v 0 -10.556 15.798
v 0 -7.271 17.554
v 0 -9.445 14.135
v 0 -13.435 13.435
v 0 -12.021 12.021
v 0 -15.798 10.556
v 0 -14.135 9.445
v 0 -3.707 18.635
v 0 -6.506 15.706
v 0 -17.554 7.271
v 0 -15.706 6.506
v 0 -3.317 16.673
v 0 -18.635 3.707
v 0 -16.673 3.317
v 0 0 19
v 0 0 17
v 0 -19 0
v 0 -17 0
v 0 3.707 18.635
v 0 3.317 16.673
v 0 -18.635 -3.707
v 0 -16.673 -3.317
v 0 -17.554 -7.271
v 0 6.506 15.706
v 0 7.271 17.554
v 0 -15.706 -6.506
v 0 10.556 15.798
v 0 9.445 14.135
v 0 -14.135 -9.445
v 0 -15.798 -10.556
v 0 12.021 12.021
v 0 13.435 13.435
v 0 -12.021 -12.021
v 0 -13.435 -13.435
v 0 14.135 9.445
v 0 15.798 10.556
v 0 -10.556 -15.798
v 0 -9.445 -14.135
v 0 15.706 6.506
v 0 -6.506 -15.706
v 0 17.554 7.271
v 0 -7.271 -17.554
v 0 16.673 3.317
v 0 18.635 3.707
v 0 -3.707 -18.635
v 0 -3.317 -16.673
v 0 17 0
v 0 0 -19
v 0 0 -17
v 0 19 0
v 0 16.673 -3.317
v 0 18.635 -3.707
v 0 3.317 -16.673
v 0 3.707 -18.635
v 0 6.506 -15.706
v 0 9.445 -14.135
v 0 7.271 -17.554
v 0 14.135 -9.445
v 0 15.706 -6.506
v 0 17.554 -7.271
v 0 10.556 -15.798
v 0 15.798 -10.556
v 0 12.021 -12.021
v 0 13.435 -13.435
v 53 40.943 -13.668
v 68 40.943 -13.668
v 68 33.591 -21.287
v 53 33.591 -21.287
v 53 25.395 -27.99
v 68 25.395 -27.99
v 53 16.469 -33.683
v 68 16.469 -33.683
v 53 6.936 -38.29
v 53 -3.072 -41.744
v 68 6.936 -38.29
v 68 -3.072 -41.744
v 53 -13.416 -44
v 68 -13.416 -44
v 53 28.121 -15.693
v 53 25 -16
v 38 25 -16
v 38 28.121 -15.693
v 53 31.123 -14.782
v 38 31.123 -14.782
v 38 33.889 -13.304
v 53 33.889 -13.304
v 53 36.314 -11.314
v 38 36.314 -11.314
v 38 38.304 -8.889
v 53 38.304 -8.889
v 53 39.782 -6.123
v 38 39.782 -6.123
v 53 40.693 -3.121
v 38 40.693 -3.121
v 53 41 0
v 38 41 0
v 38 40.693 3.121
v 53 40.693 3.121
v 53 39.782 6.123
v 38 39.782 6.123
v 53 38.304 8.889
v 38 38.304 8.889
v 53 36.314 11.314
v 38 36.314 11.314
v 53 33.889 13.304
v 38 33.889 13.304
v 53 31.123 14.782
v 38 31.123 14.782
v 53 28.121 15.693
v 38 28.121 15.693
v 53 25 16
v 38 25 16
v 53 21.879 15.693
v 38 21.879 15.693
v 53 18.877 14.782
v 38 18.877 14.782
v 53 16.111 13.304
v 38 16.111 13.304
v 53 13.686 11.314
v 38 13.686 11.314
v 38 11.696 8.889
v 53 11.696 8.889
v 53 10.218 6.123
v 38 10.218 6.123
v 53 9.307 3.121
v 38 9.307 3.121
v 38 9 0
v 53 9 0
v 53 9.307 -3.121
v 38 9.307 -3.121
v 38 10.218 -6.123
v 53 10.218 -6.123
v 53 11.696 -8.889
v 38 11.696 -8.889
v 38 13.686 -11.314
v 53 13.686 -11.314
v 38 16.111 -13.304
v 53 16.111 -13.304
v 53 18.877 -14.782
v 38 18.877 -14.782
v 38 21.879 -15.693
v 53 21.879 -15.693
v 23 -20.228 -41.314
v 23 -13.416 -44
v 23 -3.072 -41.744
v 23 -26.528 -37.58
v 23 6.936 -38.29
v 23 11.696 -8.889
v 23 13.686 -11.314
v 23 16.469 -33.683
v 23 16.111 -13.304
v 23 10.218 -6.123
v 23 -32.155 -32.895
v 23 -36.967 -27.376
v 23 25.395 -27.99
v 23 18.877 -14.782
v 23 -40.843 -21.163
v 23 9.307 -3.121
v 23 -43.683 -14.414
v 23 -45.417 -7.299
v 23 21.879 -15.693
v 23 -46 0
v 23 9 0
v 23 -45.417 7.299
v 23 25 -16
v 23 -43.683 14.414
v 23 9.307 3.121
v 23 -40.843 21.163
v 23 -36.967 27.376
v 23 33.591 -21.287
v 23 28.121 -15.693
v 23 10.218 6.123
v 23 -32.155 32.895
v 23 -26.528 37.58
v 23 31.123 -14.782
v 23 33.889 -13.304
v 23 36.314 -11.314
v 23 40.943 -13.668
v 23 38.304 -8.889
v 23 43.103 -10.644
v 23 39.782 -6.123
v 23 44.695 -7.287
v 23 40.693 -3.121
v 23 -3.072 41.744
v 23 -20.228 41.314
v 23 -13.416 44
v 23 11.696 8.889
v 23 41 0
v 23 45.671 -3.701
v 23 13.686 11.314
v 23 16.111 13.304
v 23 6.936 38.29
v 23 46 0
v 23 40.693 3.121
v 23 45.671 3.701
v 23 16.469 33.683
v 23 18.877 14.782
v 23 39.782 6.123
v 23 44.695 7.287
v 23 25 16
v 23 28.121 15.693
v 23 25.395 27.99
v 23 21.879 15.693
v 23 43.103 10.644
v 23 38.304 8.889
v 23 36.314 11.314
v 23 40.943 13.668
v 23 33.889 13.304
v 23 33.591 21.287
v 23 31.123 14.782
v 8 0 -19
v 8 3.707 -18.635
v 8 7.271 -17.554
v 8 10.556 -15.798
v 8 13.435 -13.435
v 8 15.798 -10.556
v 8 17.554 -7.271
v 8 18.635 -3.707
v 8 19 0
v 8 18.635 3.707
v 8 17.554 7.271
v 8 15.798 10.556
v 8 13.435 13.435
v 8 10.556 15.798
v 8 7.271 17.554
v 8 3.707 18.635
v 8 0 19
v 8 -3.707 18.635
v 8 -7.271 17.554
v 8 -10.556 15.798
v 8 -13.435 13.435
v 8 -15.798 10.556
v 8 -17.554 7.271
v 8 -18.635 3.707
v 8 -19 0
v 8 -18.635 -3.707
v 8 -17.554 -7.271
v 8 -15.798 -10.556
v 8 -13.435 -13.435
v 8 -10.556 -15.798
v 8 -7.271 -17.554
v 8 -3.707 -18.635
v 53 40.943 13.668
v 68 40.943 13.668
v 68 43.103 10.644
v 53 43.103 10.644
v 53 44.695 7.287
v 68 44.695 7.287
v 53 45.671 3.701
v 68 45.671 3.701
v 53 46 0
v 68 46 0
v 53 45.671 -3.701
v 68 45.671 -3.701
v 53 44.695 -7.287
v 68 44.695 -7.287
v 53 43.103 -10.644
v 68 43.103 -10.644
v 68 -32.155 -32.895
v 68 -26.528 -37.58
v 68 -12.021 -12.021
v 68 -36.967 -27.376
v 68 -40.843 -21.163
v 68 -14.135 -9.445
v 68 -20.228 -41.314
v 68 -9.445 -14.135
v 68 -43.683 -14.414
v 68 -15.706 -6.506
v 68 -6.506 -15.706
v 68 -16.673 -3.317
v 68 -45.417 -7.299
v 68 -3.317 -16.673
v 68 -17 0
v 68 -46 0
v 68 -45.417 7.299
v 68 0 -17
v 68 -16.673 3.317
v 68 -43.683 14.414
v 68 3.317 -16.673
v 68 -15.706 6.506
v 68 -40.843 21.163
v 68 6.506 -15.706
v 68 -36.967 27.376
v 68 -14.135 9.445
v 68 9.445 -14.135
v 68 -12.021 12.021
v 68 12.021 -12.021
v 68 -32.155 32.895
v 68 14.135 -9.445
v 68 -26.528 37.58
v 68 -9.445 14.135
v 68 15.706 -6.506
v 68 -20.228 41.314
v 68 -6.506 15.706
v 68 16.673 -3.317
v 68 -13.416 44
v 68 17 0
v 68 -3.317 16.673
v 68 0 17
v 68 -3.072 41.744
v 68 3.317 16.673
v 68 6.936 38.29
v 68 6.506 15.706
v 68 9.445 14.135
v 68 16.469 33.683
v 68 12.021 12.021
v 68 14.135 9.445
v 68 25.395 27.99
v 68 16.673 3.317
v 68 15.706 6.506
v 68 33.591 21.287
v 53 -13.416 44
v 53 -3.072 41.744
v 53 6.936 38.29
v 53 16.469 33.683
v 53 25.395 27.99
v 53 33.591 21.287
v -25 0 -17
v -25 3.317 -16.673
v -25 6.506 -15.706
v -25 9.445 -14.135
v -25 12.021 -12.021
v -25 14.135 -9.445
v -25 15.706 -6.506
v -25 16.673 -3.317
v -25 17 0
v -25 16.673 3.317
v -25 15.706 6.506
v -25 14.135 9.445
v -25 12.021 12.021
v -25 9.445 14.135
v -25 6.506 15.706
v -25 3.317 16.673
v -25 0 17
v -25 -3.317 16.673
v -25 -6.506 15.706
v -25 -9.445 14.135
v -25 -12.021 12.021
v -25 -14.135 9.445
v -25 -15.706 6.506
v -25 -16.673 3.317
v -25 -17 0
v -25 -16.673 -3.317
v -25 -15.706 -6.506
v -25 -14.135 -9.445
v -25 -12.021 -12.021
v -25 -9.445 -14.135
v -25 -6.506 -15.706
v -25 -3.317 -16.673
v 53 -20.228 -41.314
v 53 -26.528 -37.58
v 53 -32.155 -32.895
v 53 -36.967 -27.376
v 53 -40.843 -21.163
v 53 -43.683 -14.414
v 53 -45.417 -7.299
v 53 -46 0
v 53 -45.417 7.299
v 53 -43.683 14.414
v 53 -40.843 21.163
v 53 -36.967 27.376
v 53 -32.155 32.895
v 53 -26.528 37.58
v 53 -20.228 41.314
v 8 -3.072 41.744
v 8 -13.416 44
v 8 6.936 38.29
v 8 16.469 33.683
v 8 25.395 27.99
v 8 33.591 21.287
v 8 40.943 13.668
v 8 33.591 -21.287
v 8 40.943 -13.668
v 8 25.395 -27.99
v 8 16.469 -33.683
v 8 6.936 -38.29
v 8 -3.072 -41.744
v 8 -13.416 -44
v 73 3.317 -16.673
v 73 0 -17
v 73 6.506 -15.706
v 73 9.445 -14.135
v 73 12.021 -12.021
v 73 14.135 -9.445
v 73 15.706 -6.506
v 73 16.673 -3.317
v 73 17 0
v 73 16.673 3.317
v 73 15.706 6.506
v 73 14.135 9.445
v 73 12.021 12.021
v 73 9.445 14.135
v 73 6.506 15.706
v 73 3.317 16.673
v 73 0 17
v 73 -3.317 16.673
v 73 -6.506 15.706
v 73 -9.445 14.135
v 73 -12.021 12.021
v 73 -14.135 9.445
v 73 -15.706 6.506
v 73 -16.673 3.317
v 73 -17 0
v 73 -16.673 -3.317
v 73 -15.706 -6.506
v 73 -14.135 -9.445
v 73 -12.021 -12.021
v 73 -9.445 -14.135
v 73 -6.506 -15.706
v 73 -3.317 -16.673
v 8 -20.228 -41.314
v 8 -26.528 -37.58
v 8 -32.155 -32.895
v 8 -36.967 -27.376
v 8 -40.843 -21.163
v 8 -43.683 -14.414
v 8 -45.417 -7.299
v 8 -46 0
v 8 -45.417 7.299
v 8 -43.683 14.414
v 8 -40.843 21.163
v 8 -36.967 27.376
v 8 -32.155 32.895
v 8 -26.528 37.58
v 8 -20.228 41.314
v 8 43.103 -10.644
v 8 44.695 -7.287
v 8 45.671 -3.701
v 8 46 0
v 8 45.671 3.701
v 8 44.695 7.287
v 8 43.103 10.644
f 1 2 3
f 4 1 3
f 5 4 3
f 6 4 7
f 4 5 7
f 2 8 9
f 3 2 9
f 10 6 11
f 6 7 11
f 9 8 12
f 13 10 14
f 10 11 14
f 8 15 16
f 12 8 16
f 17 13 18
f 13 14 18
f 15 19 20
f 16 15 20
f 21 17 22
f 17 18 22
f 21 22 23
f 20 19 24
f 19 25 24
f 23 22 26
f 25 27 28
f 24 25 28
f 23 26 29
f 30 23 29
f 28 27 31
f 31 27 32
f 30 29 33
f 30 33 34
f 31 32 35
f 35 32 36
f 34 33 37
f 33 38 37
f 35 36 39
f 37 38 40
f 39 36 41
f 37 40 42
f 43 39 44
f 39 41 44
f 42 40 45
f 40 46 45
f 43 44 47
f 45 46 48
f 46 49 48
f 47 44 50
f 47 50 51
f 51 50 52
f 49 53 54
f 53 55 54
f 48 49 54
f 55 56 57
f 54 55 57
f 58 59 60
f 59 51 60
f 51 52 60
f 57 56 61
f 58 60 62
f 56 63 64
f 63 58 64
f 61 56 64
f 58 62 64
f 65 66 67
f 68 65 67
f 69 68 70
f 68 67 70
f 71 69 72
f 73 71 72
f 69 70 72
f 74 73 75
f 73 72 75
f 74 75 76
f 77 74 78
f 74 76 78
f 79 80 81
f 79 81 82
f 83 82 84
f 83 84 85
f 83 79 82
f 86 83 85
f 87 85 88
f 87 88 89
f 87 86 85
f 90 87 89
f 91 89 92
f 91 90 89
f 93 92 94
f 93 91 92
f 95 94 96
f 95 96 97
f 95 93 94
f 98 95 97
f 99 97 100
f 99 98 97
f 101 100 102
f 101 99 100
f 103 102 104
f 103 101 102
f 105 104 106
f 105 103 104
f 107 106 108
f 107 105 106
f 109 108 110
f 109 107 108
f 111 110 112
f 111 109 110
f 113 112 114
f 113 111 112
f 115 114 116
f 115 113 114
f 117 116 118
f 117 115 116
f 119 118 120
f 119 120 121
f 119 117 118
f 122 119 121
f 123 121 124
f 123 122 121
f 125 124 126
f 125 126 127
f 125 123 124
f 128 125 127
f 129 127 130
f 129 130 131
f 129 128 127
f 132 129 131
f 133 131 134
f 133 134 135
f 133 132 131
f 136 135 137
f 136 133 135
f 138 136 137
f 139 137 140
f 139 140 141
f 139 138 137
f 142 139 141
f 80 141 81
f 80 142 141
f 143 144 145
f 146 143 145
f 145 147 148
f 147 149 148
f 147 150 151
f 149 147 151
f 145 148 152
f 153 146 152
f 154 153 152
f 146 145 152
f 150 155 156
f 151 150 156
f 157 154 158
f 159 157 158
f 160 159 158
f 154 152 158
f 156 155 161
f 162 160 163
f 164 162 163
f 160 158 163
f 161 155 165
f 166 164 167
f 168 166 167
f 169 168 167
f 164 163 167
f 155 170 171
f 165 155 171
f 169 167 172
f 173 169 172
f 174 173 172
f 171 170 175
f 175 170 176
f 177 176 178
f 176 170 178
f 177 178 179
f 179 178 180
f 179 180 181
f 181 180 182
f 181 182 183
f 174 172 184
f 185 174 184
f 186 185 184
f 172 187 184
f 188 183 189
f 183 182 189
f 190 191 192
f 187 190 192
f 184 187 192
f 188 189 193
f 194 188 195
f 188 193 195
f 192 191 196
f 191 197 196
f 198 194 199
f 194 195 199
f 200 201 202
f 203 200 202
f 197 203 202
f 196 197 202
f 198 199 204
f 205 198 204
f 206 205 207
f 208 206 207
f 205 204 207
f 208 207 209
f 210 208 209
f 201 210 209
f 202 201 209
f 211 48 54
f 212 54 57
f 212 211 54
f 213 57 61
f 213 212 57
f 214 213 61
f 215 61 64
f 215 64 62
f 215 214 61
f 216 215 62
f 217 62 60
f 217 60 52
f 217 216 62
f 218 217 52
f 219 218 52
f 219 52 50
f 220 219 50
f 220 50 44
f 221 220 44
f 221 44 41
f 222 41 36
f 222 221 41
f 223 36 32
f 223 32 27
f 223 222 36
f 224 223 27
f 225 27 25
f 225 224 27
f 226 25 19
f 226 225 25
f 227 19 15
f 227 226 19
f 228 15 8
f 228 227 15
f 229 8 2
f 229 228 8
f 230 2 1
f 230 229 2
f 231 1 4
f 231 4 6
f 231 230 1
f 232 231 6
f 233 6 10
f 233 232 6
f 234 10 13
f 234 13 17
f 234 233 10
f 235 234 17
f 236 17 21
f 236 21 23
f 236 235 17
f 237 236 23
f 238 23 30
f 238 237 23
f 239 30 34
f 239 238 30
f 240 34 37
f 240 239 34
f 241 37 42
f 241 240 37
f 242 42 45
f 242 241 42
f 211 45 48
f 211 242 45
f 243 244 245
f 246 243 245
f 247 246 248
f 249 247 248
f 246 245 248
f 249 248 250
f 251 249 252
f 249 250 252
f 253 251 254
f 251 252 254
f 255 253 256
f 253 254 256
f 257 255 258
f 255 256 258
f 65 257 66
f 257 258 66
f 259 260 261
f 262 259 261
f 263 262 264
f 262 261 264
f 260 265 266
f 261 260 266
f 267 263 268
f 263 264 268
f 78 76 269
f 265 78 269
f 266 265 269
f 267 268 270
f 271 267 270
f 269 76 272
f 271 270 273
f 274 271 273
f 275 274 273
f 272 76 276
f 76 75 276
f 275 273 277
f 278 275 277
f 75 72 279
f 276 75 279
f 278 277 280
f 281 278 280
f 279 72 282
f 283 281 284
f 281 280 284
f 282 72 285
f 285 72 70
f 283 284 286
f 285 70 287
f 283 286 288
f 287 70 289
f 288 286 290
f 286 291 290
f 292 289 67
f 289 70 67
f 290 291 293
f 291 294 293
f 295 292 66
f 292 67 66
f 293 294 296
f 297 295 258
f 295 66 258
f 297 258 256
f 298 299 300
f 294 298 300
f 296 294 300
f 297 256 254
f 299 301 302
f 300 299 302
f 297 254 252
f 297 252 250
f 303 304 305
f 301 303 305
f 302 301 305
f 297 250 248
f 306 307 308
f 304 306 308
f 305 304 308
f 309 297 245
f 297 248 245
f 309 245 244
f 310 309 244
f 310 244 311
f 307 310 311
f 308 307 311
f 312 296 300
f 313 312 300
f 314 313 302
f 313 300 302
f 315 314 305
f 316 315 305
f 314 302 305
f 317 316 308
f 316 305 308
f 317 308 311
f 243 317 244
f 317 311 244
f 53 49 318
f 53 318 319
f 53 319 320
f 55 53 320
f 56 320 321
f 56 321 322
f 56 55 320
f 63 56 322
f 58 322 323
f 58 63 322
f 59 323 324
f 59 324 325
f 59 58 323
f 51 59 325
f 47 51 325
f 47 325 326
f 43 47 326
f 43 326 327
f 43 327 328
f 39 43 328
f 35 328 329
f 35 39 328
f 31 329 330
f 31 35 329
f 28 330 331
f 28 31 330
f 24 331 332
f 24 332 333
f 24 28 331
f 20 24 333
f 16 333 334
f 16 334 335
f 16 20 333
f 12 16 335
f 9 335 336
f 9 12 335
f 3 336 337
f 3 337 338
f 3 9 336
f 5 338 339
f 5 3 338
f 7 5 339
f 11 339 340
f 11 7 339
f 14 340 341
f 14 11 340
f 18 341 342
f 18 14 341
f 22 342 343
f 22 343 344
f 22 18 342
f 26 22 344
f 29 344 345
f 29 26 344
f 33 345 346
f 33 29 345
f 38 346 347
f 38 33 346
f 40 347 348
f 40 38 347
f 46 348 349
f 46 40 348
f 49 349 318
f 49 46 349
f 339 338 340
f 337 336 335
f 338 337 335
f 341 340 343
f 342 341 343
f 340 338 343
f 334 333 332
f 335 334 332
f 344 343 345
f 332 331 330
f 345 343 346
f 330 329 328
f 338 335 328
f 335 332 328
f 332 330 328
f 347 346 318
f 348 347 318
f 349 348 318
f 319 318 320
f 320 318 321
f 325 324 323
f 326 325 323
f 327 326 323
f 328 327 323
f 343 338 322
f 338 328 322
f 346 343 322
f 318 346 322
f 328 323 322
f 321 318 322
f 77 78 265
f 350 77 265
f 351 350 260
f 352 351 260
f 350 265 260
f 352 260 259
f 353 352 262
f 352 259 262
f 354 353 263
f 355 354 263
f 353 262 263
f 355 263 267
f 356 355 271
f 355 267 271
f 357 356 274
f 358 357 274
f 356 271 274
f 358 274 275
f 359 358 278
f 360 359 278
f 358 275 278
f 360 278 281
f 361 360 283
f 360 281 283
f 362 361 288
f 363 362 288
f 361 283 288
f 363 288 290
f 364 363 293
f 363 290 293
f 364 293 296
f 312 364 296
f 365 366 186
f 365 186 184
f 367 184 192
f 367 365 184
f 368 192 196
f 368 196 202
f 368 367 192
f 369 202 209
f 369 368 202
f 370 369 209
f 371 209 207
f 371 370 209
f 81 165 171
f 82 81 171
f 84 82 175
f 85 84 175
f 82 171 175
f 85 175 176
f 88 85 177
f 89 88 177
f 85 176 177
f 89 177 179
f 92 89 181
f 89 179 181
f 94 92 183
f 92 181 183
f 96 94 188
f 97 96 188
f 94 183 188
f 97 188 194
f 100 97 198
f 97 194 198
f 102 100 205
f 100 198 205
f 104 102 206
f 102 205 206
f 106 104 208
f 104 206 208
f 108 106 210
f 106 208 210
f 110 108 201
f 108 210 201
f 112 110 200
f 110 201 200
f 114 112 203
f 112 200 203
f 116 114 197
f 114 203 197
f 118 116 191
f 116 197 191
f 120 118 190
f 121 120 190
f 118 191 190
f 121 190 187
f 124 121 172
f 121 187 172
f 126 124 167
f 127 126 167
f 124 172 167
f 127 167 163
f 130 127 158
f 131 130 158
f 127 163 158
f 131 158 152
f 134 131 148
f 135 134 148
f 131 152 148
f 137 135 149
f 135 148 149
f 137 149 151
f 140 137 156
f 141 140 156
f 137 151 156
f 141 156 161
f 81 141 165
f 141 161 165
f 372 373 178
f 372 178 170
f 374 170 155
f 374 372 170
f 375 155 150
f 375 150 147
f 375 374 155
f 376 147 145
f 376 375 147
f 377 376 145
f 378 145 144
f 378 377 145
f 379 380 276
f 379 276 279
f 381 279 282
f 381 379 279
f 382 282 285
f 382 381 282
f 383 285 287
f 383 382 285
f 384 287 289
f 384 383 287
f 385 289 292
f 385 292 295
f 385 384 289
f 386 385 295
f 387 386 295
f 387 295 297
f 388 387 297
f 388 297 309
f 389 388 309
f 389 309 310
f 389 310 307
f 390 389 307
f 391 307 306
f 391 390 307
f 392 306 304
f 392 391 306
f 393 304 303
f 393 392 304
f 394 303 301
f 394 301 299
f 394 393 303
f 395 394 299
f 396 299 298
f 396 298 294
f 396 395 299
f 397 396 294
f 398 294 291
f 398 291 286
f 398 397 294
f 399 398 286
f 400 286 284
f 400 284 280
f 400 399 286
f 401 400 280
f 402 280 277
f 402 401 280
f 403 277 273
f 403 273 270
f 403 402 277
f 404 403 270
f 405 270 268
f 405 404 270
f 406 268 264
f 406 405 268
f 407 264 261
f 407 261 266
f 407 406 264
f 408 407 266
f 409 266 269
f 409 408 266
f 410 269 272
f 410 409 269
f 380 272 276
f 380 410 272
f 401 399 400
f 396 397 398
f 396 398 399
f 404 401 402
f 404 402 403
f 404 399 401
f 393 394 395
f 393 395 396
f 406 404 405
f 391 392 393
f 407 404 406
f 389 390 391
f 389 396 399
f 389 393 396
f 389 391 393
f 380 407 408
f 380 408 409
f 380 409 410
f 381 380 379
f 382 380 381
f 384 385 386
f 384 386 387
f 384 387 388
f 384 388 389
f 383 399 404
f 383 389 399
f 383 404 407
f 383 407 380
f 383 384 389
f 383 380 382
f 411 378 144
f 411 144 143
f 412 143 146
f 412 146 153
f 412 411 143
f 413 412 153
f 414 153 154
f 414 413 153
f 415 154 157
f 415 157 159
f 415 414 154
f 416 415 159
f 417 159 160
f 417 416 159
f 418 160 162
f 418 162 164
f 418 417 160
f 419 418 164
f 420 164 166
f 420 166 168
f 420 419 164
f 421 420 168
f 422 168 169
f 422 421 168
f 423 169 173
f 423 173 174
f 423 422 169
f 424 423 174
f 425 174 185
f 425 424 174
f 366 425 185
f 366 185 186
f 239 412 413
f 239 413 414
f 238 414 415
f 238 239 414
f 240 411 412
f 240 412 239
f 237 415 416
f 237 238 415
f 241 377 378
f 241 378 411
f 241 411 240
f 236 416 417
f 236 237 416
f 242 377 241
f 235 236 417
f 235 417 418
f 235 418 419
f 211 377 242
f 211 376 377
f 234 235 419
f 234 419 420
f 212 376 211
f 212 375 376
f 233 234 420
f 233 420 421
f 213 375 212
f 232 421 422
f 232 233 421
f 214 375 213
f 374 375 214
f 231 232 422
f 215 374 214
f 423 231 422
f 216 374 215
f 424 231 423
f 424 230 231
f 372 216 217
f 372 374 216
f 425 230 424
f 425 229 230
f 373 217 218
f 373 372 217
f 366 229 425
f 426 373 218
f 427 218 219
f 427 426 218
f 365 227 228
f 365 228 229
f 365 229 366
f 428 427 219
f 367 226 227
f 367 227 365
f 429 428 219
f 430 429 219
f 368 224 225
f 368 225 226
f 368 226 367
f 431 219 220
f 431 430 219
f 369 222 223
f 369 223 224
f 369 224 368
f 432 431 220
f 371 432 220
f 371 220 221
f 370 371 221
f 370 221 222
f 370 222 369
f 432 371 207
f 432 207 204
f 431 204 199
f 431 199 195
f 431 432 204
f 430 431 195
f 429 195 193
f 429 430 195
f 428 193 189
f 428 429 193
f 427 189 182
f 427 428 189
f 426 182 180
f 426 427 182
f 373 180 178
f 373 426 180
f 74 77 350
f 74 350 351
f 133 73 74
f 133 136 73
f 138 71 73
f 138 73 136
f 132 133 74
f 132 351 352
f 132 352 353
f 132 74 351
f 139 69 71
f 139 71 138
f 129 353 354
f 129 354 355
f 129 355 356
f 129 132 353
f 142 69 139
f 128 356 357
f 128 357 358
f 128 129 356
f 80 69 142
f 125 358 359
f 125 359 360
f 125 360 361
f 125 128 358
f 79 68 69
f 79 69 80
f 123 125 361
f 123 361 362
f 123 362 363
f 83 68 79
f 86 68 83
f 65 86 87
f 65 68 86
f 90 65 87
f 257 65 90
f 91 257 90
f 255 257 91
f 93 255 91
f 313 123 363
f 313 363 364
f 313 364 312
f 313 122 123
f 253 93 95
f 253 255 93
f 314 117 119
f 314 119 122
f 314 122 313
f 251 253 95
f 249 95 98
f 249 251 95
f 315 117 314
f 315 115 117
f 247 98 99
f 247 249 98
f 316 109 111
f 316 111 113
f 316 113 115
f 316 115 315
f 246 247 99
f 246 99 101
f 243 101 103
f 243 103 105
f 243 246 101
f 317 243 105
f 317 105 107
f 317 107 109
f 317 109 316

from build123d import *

# Parameters (mm, degrees)
SKETCH1_R           = 17
BOSS_EXTRUDE1_DEPTH = 25
SKETCH1_6_R         = 19
BOSS_EXTRUDE5_DEPTH = 8
BOSS_EXTRUDE6_DEPTH = 15
SKETCH4_R           = 16
BOSS_EXTRUDE7_DEPTH = 15
BOSS_EXTRUDE8_START = 5
SKETCH5_R           = 17
BOSS_EXTRUDE8_DEPTH = 5


with BuildPart() as part:
    # Sketch1 → Boss-Extrude1 (new body)
    with BuildSketch(Plane(origin=(0, 0, 0), x_dir=(0, 0, -1), z_dir=(1, 0, 0))):
        Circle(SKETCH1_R)
    extrude(amount=-BOSS_EXTRUDE1_DEPTH)

    # Sketch1<6> → Boss-Extrude5 (add)
    with BuildSketch(Plane(origin=(0, 0, 0), x_dir=(0, 0, -1), z_dir=(1, 0, 0))):
        Circle(SKETCH1_6_R)
    extrude(amount=BOSS_EXTRUDE5_DEPTH)

    # Sketch2 → Boss-Extrude6 (add)
    with BuildSketch(Plane(origin=(8, 0, 0), x_dir=(0, 0, -1), z_dir=(1, 0, 0))):
        with BuildLine():
            ThreePointArc((-13.668094758, 40.943123461), (0, 46), (13.668094758, 40.943123461))
            ThreePointArc((13.668094758, 40.943123461), (33.683444249, 16.469257624), (44, -13.416407865))
            ThreePointArc((44, -13.416407865), (0, -46), (-44, -13.416407865))
            ThreePointArc((-44, -13.416407865), (-33.683444249, 16.469257624), (-13.668094758, 40.943123461))
        make_face()
    boss_extrude6 = extrude(amount=BOSS_EXTRUDE6_DEPTH)

    # Sketch4 → Boss-Extrude7 (add)
    with BuildSketch(Plane(origin=(23, 0, 0), x_dir=(0, 0, -1), z_dir=(1, 0, 0))):
        with Locations((0, 25)):
            Circle(SKETCH4_R)
    boss_extrude7 = extrude(amount=BOSS_EXTRUDE7_DEPTH)

    # Mirror1: Boss-Extrude6, Boss-Extrude7 across plane
    add(boss_extrude6.mirror(Plane(origin=(38, 25, 0), x_dir=(0, 0, 1), z_dir=(1, 0, 0))))
    add(boss_extrude7.mirror(Plane(origin=(38, 25, 0), x_dir=(0, 0, 1), z_dir=(1, 0, 0))))

    # Sketch5 → Boss-Extrude8 (add)
    with BuildSketch(Plane(origin=(68, 0, 0), x_dir=(0, 0, -1), z_dir=(1, 0, 0)).offset(BOSS_EXTRUDE8_START)):
        Circle(SKETCH5_R)
    extrude(amount=-BOSS_EXTRUDE8_DEPTH)


solid = part.part
